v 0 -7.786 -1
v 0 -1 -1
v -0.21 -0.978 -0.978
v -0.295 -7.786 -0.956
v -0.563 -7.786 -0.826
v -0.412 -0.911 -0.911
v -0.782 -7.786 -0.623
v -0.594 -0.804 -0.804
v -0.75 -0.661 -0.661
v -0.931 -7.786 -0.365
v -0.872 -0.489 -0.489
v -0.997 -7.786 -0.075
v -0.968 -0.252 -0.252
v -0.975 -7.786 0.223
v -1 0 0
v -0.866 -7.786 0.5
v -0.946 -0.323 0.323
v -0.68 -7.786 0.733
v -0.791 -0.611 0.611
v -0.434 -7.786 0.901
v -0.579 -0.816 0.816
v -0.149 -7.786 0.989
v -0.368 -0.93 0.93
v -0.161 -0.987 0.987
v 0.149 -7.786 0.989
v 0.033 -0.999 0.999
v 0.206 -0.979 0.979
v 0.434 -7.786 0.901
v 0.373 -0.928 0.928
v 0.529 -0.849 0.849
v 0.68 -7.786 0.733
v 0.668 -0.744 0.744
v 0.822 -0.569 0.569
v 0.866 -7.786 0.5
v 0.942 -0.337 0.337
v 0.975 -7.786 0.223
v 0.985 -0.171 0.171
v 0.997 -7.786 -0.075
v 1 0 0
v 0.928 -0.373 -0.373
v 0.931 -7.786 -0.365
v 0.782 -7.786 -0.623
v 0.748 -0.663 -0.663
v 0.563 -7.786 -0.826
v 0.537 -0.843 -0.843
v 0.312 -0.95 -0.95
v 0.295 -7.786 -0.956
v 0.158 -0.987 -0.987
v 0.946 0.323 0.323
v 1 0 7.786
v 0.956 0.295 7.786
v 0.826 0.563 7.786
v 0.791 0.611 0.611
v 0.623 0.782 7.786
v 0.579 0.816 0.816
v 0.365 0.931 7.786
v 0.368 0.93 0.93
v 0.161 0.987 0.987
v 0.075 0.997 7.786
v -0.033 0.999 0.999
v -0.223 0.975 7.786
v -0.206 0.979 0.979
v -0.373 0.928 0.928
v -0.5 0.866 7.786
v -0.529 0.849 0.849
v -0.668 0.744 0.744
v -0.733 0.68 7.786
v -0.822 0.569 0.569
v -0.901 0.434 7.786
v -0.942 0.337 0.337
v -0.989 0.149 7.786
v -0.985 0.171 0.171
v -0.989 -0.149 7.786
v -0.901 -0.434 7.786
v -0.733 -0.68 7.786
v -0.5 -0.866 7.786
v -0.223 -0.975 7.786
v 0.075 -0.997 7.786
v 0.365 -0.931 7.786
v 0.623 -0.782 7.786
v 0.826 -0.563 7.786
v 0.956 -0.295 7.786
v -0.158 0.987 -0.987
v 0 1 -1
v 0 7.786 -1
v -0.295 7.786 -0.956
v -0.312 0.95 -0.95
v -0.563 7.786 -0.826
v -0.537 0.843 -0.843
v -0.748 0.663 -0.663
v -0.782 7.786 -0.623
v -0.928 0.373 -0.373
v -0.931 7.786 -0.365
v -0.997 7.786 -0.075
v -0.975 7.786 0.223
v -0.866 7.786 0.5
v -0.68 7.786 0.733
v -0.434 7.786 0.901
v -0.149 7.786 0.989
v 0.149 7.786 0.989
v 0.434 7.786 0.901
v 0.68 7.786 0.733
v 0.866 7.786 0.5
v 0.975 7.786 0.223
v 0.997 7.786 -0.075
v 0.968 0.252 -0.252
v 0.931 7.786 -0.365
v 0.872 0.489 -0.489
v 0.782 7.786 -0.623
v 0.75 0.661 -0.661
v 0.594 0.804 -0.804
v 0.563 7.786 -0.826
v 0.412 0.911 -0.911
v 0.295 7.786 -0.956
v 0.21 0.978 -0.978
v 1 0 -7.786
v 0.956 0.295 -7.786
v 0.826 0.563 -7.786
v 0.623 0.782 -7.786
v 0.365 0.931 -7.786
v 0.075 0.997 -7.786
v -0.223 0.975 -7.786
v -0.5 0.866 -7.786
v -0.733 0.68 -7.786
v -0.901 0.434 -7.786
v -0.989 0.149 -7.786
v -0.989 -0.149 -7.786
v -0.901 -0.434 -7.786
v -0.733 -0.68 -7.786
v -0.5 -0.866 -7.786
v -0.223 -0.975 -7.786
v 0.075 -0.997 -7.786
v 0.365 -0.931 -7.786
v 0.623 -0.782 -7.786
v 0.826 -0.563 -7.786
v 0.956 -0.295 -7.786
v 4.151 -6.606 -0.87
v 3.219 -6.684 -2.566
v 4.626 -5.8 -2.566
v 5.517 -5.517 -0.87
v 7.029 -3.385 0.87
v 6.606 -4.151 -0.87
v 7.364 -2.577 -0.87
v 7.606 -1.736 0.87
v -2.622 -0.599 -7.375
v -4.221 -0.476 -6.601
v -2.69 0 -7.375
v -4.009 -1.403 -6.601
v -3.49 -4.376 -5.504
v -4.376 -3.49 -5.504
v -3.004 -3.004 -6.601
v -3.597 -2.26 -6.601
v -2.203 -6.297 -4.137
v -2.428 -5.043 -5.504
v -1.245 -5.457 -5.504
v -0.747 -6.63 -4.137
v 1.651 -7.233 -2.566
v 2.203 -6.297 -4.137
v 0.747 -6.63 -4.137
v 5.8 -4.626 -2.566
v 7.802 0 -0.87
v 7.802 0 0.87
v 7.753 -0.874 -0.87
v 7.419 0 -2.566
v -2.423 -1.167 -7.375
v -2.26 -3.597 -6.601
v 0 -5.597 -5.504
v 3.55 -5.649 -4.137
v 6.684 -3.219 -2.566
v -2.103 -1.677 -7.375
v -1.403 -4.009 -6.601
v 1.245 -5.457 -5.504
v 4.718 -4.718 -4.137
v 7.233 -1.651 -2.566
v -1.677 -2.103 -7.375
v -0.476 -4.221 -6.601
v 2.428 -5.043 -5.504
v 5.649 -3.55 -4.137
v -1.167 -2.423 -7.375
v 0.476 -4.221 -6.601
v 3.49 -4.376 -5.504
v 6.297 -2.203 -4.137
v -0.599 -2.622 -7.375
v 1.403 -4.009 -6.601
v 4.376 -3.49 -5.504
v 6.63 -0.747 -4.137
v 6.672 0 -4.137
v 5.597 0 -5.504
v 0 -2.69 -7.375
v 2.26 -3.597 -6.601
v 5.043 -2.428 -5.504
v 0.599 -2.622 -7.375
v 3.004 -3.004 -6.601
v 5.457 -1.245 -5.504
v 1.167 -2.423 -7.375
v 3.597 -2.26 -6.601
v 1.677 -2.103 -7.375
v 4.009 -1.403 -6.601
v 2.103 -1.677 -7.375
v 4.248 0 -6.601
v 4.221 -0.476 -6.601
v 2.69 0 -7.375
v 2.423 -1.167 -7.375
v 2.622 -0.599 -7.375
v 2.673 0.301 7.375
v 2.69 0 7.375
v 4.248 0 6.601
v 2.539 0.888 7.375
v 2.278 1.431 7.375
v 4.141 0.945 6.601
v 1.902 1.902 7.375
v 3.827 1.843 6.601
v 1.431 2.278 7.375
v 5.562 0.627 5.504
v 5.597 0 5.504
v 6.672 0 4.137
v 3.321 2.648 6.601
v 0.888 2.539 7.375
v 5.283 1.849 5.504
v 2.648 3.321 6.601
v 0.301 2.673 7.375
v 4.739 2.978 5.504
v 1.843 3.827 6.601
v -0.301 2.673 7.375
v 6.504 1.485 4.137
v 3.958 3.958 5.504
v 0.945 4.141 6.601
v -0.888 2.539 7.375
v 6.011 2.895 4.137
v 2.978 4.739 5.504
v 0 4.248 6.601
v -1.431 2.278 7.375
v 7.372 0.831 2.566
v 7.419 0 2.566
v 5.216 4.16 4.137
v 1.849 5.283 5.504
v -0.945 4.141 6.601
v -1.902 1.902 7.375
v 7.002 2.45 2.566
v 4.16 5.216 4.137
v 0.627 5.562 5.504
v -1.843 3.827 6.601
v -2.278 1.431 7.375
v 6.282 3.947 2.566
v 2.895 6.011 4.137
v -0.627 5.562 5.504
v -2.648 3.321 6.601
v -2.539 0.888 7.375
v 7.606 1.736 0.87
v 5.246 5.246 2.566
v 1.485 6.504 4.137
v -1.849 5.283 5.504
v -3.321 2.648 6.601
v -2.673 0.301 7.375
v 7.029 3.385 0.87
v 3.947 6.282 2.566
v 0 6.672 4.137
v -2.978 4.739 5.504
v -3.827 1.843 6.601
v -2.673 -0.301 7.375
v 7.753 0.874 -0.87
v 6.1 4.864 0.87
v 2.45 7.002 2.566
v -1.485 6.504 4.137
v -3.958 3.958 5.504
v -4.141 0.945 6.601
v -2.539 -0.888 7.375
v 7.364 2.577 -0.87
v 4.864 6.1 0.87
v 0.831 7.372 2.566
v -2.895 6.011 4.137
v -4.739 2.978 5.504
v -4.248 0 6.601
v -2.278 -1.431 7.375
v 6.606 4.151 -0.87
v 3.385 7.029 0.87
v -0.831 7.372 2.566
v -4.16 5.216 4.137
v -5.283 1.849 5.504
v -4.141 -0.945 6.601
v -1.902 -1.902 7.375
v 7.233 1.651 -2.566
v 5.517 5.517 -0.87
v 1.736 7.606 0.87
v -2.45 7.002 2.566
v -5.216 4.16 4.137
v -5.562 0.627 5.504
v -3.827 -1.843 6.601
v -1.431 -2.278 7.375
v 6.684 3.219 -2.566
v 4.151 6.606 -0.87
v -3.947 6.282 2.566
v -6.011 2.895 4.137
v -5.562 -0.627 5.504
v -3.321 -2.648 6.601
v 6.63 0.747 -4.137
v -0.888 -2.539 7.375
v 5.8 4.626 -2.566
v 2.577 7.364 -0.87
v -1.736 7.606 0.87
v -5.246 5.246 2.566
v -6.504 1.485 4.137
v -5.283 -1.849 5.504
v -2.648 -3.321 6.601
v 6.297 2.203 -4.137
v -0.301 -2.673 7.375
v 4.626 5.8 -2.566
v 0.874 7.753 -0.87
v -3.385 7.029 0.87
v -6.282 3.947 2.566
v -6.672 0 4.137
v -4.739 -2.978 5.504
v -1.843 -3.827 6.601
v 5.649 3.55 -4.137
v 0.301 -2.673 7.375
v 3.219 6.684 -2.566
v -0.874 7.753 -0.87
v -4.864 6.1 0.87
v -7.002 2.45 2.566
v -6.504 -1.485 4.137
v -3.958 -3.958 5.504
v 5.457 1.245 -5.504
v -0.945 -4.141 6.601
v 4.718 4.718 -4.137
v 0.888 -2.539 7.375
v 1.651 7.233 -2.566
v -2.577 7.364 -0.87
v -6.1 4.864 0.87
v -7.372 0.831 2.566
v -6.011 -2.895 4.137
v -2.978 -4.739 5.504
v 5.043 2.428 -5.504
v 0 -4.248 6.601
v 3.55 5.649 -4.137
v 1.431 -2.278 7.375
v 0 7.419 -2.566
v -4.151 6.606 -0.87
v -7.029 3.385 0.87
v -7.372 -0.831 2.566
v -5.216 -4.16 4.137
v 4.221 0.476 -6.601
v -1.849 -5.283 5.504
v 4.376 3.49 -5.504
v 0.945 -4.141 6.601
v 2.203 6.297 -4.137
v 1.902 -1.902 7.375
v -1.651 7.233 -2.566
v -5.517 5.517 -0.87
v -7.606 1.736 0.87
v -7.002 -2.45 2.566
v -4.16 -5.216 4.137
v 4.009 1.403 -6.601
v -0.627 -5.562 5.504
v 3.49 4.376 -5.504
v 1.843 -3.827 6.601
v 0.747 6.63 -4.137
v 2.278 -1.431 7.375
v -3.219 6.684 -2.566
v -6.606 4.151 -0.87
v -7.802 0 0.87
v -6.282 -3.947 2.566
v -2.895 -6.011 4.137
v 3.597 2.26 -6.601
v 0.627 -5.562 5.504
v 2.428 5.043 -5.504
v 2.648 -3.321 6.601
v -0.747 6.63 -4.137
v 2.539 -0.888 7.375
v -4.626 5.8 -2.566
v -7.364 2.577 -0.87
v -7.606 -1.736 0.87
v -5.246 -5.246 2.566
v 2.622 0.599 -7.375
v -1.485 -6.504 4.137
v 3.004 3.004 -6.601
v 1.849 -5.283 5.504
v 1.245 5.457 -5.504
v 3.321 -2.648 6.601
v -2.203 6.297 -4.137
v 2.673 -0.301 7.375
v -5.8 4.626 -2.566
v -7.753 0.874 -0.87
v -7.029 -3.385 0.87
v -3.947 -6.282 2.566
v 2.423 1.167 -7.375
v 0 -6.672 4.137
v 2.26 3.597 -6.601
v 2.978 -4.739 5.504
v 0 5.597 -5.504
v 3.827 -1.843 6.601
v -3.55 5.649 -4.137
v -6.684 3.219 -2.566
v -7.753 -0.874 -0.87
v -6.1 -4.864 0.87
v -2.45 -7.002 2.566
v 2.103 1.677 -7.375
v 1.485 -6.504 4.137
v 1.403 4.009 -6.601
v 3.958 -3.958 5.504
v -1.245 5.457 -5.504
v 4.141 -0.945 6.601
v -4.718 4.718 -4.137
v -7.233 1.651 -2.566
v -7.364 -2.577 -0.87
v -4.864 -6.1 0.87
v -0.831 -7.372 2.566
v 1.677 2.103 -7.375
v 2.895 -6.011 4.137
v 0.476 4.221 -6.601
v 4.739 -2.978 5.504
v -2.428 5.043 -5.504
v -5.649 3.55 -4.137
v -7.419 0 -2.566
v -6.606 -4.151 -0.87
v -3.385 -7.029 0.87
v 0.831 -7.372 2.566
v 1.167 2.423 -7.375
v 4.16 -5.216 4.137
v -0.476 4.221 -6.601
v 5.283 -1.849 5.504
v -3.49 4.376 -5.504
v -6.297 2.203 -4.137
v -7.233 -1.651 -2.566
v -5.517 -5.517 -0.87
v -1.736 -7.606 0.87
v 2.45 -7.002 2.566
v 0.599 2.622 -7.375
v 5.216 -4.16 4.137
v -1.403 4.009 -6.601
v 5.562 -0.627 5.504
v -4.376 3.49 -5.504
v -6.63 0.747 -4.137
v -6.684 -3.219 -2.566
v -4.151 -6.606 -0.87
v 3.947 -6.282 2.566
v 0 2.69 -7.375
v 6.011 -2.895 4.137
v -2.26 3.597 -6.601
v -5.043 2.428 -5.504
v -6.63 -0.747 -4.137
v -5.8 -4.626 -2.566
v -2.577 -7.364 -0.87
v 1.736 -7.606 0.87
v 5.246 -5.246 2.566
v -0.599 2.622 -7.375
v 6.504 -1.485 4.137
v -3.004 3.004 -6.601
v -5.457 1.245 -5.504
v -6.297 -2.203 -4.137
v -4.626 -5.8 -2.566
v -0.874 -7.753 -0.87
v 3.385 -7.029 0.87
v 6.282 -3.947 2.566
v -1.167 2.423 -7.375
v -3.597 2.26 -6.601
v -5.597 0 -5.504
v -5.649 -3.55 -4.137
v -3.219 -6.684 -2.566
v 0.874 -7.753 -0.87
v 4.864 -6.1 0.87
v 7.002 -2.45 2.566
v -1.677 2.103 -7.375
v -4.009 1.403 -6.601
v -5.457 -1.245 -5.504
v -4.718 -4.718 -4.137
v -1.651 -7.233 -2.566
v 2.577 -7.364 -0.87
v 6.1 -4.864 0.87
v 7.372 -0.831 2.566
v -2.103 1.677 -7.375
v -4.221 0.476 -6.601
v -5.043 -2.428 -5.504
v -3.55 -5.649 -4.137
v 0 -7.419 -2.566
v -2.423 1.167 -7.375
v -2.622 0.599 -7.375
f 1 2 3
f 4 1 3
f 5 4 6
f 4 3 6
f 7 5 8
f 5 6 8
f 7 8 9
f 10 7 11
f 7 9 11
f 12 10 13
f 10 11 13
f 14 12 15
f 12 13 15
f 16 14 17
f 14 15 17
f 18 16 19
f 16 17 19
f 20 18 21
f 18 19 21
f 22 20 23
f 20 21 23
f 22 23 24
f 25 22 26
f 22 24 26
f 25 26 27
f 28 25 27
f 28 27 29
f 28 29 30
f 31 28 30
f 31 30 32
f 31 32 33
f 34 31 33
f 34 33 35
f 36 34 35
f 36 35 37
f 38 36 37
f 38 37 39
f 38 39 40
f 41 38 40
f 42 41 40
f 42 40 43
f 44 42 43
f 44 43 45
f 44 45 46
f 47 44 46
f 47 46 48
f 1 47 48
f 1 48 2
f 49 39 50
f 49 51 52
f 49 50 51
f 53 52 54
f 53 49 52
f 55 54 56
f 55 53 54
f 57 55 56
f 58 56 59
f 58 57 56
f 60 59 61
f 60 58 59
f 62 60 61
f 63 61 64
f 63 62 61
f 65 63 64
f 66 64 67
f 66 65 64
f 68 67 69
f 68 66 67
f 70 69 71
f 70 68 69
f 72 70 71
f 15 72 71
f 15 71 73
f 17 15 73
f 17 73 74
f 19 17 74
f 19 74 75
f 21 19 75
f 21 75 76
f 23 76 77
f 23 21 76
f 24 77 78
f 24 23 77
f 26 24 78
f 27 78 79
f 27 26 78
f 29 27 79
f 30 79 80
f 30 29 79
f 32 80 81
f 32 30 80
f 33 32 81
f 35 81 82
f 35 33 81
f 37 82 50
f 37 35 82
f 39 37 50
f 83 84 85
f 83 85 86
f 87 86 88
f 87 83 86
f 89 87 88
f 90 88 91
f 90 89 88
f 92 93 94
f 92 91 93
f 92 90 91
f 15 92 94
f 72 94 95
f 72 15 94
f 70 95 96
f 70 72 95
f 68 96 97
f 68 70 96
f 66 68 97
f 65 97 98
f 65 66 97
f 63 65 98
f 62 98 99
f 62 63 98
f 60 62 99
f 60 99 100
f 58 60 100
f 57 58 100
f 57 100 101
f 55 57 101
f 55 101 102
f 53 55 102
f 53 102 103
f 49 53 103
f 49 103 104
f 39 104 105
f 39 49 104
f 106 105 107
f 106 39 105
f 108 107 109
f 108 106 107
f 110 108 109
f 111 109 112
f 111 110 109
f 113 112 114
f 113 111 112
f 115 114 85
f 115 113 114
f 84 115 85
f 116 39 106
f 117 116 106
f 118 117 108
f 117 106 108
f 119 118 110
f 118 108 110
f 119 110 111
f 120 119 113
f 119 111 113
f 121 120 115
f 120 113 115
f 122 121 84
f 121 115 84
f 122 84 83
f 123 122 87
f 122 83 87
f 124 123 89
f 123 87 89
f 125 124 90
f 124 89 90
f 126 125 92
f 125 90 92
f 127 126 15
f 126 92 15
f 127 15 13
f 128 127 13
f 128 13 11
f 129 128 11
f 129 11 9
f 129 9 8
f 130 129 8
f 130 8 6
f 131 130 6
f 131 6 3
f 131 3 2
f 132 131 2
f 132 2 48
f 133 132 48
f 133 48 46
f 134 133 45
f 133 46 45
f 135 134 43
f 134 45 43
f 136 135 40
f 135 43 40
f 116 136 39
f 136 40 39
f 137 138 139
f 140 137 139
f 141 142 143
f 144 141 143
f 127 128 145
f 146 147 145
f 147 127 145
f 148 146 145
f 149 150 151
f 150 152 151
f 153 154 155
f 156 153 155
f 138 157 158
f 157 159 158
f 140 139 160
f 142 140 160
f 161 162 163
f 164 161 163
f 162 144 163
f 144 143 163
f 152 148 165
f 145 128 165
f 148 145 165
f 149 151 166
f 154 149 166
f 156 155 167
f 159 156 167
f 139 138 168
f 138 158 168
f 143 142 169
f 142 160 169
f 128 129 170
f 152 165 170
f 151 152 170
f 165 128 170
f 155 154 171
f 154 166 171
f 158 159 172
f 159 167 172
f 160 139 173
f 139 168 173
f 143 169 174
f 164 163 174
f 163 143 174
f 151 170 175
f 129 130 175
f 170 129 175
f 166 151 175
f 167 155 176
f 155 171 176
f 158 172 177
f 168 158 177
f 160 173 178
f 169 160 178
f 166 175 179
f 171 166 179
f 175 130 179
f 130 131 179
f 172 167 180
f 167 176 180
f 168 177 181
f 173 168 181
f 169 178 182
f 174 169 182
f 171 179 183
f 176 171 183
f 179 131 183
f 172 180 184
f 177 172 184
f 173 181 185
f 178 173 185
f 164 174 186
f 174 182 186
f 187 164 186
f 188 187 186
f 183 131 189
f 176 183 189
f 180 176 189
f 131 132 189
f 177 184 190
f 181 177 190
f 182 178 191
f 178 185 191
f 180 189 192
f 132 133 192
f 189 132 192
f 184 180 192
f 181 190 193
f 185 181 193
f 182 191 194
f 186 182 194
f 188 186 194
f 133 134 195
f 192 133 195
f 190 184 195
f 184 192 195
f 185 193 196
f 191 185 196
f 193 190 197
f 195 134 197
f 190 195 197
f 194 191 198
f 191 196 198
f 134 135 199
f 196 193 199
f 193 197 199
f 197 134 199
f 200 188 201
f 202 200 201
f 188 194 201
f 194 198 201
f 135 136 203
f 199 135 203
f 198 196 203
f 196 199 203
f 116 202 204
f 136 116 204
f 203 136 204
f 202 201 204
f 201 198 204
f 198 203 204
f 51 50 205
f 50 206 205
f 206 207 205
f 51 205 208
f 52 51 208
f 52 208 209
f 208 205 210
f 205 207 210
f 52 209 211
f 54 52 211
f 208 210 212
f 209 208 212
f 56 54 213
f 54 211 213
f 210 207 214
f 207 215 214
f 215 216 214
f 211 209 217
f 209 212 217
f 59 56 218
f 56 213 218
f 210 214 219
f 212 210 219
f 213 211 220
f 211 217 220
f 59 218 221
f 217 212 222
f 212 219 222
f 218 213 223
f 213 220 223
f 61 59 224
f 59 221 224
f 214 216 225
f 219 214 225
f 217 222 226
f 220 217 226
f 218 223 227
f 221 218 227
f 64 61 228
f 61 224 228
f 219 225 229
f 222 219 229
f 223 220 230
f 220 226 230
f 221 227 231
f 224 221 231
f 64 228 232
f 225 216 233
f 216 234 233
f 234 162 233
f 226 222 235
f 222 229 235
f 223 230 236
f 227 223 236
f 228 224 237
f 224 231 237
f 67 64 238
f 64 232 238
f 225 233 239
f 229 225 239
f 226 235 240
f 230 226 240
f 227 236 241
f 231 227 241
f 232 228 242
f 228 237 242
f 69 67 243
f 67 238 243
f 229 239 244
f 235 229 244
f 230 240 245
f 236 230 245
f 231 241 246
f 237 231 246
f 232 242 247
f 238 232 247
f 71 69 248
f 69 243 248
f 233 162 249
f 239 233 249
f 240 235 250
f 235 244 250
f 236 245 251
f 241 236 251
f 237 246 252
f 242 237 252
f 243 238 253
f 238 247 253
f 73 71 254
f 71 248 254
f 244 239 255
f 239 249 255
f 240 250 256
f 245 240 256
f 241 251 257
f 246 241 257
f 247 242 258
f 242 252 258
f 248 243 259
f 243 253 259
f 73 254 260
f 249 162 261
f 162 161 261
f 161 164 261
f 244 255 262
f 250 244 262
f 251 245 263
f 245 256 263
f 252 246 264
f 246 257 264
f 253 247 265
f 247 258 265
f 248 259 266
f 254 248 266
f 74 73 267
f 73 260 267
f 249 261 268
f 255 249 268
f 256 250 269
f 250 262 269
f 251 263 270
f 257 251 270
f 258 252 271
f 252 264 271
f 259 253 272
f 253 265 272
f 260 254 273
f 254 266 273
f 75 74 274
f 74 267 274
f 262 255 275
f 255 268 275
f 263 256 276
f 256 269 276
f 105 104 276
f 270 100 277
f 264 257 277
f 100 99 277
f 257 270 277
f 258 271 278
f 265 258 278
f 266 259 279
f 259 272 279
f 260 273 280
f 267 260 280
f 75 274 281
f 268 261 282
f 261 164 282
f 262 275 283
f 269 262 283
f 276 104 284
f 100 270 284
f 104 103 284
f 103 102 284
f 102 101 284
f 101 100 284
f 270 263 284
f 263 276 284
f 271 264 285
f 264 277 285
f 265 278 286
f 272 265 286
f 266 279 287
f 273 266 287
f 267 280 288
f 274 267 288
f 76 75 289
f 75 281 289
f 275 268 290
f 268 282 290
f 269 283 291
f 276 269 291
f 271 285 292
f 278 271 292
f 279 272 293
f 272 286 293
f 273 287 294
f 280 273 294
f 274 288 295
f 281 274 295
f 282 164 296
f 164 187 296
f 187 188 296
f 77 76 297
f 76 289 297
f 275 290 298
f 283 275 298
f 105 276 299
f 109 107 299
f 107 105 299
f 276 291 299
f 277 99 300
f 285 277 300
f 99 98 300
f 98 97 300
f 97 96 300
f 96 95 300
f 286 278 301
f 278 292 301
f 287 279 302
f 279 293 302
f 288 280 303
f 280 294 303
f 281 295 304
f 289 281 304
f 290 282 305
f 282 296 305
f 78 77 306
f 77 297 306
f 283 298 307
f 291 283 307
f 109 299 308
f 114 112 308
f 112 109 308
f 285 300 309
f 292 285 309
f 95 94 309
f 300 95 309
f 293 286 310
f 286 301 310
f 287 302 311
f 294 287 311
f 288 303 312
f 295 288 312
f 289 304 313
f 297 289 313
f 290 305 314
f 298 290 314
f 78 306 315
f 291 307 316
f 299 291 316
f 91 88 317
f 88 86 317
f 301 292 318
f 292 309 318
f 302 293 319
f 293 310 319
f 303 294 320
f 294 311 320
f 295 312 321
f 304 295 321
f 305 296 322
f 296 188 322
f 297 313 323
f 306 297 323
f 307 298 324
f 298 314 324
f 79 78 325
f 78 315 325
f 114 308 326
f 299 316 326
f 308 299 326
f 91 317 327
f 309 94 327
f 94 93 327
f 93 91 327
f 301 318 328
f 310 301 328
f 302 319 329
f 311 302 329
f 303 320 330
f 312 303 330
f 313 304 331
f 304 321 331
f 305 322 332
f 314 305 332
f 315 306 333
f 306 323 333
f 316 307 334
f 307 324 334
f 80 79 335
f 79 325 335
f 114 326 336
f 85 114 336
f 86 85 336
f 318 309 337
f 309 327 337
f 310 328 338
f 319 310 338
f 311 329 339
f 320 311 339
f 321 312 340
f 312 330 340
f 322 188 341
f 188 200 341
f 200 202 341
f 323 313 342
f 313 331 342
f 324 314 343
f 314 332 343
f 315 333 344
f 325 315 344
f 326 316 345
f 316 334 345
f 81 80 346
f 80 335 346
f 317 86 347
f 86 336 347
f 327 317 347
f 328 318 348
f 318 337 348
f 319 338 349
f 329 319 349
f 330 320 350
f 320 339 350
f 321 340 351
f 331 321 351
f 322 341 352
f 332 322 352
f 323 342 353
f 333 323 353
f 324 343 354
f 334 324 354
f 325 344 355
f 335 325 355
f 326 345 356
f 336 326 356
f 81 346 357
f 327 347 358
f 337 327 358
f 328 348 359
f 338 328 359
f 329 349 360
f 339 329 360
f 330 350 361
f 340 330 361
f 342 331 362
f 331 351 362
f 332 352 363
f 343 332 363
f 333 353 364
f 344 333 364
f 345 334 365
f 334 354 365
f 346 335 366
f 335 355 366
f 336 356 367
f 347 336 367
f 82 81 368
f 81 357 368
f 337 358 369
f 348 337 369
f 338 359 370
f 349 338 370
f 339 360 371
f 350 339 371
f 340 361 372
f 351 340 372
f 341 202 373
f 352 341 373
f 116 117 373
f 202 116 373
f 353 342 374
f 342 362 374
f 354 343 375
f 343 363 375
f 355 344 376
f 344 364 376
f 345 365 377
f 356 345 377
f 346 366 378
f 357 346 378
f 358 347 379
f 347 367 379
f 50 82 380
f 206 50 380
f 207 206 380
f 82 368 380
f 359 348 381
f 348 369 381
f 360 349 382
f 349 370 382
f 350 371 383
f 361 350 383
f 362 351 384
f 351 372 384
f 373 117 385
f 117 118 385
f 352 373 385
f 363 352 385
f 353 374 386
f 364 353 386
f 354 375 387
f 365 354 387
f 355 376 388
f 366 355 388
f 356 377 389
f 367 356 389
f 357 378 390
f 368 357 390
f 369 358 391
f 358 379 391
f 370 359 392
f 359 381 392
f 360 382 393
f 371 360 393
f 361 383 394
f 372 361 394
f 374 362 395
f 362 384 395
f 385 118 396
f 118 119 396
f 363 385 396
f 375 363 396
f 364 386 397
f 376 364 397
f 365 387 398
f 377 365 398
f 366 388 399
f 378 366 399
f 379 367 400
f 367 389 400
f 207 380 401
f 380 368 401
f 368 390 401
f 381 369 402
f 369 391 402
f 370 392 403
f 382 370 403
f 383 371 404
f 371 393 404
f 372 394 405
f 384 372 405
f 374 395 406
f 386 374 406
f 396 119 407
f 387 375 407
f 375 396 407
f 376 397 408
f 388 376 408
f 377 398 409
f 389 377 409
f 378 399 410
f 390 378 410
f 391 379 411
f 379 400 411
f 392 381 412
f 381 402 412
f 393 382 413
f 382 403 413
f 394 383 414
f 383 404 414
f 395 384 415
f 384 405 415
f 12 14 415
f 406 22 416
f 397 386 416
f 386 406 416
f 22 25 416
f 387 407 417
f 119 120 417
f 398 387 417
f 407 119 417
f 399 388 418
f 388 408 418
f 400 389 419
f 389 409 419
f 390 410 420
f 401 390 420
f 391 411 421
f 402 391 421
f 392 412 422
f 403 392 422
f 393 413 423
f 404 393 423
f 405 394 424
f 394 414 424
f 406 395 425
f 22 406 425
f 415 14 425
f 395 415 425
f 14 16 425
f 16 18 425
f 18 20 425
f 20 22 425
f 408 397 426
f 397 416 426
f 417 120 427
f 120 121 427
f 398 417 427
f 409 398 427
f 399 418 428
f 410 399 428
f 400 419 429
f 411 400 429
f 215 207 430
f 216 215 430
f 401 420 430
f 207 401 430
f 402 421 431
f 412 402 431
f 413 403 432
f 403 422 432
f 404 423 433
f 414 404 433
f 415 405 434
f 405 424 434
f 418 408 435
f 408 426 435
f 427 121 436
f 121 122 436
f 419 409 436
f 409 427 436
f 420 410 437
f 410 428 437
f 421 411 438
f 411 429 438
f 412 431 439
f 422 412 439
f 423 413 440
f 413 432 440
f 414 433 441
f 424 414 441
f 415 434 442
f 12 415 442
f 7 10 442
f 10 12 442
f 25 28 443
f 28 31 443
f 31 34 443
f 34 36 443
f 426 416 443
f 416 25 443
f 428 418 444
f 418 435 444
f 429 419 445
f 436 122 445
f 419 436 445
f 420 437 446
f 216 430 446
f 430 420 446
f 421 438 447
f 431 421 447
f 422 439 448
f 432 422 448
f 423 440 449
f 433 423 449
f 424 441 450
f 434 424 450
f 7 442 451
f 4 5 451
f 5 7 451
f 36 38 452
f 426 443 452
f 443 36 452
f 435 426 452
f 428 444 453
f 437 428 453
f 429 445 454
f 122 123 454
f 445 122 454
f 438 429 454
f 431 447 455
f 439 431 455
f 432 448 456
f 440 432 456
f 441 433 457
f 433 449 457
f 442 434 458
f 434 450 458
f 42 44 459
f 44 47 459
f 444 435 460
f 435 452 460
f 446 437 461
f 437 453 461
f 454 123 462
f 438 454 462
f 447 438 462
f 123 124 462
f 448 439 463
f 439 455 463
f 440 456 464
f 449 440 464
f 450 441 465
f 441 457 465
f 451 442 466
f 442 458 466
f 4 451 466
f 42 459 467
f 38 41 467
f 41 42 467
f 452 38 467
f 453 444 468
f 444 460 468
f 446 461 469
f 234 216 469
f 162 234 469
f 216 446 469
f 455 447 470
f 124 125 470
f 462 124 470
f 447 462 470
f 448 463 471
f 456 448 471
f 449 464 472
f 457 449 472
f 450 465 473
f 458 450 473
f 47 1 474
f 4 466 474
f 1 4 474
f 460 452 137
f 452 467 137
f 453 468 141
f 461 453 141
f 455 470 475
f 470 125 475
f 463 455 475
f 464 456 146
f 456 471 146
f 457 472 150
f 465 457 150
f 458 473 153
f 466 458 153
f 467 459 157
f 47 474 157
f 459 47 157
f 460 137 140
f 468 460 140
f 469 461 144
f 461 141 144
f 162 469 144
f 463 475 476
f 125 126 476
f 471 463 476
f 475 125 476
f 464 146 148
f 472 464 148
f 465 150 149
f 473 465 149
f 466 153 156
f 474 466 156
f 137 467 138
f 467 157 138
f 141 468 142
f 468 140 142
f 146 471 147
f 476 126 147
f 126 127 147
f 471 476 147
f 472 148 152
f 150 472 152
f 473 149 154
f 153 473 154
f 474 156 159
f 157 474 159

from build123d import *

# Parameters (mm, degrees)
CUT_EXTRUDE3_REACH                  = 15.597
CUT_EXTRUDE3_END_RADIUS             = 7.85
SKETCH3_R                           = 1
CUT_EXTRUDE3_DIRECTION_2_REACH      = 15.597
CUT_EXTRUDE3_DIRECTION_2_END_RADIUS = 7.85
CUT_EXTRUDE4_REACH                  = 15.597
CUT_EXTRUDE4_END_RADIUS             = 7.85
SKETCH4_R                           = 1
CUT_EXTRUDE4_DIRECTION_2_REACH      = 15.597
CUT_EXTRUDE4_DIRECTION_2_END_RADIUS = 7.85


with BuildPart() as part:
    # Sketch2 → Revolve1 (revolve)
    with BuildSketch(Plane(origin=(0, 0, 0), x_dir=(1, 0, 0), z_dir=(0, 1, 0))):
        with BuildLine():
            Line((0, 7.85), (0, -7.85))
            ThreePointArc((0, -7.85), (7.85, 0), (0, 7.85))
        make_face()
    revolve(axis=Axis((0, 0, -7.85), (0, 0, 1)))

    # Cut-Extrude3: up to this sphere (the profile starts inside it)
    cut_extrude3_end = Location((0, 0, 0)) * Sphere(CUT_EXTRUDE3_END_RADIUS, mode=Mode.PRIVATE)
    # Sketch3 → Cut-Extrude3 (cut, up to the surface)
    with BuildSketch(Plane(origin=(0, 0, 0), x_dir=(1, 0, 0), z_dir=(0, 1, 0)), mode=Mode.PRIVATE) as cut_extrude3_sk1:
        with Locations(Location((0, 0, 0), (0, 0, 90))):
            Circle(SKETCH3_R)
    cut_extrude3_tool1 = extrude(cut_extrude3_sk1.sketch, amount=-CUT_EXTRUDE3_REACH, mode=Mode.PRIVATE) & cut_extrude3_end
    add(cut_extrude3_tool1.solids().sort_by_distance((0, 0, 0))[0], mode=Mode.SUBTRACT)

    # Cut-Extrude3 direction 2: up to this sphere (the profile starts inside it)
    cut_extrude3_direction_2_end = Location((0, 0, 0)) * Sphere(CUT_EXTRUDE3_DIRECTION_2_END_RADIUS, mode=Mode.PRIVATE)
    # Sketch3 → Cut-Extrude3 direction 2 (cut, up to the surface)
    with BuildSketch(Plane(origin=(0, 0, 0), x_dir=(1, 0, 0), z_dir=(0, 1, 0)), mode=Mode.PRIVATE) as cut_extrude3_direction_2_sk1:
        with Locations(Location((0, 0, 0), (0, 0, 90))):
            Circle(SKETCH3_R)
    cut_extrude3_direction_2_tool1 = extrude(cut_extrude3_direction_2_sk1.sketch, amount=CUT_EXTRUDE3_DIRECTION_2_REACH, mode=Mode.PRIVATE) & cut_extrude3_direction_2_end
    add(cut_extrude3_direction_2_tool1.solids().sort_by_distance((0, 0, 0))[0], mode=Mode.SUBTRACT)

    # Cut-Extrude4: up to this sphere (the profile starts inside it)
    cut_extrude4_end = Location((0, 0, 0)) * Sphere(CUT_EXTRUDE4_END_RADIUS, mode=Mode.PRIVATE)
    # Sketch4 → Cut-Extrude4 (cut, up to the surface)
    with BuildSketch(Plane.XY, mode=Mode.PRIVATE) as cut_extrude4_sk1:
        Circle(SKETCH4_R)
    cut_extrude4_tool1 = extrude(cut_extrude4_sk1.sketch, amount=-CUT_EXTRUDE4_REACH, mode=Mode.PRIVATE) & cut_extrude4_end
    add(cut_extrude4_tool1.solids().sort_by_distance((0, 0, 0))[0], mode=Mode.SUBTRACT)

    # Cut-Extrude4 direction 2: up to this sphere (the profile starts inside it)
    cut_extrude4_direction_2_end = Location((0, 0, 0)) * Sphere(CUT_EXTRUDE4_DIRECTION_2_END_RADIUS, mode=Mode.PRIVATE)
    # Sketch4 → Cut-Extrude4 direction 2 (cut, up to the surface)
    with BuildSketch(Plane.XY, mode=Mode.PRIVATE) as cut_extrude4_direction_2_sk1:
        Circle(SKETCH4_R)
    cut_extrude4_direction_2_tool1 = extrude(cut_extrude4_direction_2_sk1.sketch, amount=CUT_EXTRUDE4_DIRECTION_2_REACH, mode=Mode.PRIVATE) & cut_extrude4_direction_2_end
    add(cut_extrude4_direction_2_tool1.solids().sort_by_distance((0, 0, 0))[0], mode=Mode.SUBTRACT)


solid = part.part
